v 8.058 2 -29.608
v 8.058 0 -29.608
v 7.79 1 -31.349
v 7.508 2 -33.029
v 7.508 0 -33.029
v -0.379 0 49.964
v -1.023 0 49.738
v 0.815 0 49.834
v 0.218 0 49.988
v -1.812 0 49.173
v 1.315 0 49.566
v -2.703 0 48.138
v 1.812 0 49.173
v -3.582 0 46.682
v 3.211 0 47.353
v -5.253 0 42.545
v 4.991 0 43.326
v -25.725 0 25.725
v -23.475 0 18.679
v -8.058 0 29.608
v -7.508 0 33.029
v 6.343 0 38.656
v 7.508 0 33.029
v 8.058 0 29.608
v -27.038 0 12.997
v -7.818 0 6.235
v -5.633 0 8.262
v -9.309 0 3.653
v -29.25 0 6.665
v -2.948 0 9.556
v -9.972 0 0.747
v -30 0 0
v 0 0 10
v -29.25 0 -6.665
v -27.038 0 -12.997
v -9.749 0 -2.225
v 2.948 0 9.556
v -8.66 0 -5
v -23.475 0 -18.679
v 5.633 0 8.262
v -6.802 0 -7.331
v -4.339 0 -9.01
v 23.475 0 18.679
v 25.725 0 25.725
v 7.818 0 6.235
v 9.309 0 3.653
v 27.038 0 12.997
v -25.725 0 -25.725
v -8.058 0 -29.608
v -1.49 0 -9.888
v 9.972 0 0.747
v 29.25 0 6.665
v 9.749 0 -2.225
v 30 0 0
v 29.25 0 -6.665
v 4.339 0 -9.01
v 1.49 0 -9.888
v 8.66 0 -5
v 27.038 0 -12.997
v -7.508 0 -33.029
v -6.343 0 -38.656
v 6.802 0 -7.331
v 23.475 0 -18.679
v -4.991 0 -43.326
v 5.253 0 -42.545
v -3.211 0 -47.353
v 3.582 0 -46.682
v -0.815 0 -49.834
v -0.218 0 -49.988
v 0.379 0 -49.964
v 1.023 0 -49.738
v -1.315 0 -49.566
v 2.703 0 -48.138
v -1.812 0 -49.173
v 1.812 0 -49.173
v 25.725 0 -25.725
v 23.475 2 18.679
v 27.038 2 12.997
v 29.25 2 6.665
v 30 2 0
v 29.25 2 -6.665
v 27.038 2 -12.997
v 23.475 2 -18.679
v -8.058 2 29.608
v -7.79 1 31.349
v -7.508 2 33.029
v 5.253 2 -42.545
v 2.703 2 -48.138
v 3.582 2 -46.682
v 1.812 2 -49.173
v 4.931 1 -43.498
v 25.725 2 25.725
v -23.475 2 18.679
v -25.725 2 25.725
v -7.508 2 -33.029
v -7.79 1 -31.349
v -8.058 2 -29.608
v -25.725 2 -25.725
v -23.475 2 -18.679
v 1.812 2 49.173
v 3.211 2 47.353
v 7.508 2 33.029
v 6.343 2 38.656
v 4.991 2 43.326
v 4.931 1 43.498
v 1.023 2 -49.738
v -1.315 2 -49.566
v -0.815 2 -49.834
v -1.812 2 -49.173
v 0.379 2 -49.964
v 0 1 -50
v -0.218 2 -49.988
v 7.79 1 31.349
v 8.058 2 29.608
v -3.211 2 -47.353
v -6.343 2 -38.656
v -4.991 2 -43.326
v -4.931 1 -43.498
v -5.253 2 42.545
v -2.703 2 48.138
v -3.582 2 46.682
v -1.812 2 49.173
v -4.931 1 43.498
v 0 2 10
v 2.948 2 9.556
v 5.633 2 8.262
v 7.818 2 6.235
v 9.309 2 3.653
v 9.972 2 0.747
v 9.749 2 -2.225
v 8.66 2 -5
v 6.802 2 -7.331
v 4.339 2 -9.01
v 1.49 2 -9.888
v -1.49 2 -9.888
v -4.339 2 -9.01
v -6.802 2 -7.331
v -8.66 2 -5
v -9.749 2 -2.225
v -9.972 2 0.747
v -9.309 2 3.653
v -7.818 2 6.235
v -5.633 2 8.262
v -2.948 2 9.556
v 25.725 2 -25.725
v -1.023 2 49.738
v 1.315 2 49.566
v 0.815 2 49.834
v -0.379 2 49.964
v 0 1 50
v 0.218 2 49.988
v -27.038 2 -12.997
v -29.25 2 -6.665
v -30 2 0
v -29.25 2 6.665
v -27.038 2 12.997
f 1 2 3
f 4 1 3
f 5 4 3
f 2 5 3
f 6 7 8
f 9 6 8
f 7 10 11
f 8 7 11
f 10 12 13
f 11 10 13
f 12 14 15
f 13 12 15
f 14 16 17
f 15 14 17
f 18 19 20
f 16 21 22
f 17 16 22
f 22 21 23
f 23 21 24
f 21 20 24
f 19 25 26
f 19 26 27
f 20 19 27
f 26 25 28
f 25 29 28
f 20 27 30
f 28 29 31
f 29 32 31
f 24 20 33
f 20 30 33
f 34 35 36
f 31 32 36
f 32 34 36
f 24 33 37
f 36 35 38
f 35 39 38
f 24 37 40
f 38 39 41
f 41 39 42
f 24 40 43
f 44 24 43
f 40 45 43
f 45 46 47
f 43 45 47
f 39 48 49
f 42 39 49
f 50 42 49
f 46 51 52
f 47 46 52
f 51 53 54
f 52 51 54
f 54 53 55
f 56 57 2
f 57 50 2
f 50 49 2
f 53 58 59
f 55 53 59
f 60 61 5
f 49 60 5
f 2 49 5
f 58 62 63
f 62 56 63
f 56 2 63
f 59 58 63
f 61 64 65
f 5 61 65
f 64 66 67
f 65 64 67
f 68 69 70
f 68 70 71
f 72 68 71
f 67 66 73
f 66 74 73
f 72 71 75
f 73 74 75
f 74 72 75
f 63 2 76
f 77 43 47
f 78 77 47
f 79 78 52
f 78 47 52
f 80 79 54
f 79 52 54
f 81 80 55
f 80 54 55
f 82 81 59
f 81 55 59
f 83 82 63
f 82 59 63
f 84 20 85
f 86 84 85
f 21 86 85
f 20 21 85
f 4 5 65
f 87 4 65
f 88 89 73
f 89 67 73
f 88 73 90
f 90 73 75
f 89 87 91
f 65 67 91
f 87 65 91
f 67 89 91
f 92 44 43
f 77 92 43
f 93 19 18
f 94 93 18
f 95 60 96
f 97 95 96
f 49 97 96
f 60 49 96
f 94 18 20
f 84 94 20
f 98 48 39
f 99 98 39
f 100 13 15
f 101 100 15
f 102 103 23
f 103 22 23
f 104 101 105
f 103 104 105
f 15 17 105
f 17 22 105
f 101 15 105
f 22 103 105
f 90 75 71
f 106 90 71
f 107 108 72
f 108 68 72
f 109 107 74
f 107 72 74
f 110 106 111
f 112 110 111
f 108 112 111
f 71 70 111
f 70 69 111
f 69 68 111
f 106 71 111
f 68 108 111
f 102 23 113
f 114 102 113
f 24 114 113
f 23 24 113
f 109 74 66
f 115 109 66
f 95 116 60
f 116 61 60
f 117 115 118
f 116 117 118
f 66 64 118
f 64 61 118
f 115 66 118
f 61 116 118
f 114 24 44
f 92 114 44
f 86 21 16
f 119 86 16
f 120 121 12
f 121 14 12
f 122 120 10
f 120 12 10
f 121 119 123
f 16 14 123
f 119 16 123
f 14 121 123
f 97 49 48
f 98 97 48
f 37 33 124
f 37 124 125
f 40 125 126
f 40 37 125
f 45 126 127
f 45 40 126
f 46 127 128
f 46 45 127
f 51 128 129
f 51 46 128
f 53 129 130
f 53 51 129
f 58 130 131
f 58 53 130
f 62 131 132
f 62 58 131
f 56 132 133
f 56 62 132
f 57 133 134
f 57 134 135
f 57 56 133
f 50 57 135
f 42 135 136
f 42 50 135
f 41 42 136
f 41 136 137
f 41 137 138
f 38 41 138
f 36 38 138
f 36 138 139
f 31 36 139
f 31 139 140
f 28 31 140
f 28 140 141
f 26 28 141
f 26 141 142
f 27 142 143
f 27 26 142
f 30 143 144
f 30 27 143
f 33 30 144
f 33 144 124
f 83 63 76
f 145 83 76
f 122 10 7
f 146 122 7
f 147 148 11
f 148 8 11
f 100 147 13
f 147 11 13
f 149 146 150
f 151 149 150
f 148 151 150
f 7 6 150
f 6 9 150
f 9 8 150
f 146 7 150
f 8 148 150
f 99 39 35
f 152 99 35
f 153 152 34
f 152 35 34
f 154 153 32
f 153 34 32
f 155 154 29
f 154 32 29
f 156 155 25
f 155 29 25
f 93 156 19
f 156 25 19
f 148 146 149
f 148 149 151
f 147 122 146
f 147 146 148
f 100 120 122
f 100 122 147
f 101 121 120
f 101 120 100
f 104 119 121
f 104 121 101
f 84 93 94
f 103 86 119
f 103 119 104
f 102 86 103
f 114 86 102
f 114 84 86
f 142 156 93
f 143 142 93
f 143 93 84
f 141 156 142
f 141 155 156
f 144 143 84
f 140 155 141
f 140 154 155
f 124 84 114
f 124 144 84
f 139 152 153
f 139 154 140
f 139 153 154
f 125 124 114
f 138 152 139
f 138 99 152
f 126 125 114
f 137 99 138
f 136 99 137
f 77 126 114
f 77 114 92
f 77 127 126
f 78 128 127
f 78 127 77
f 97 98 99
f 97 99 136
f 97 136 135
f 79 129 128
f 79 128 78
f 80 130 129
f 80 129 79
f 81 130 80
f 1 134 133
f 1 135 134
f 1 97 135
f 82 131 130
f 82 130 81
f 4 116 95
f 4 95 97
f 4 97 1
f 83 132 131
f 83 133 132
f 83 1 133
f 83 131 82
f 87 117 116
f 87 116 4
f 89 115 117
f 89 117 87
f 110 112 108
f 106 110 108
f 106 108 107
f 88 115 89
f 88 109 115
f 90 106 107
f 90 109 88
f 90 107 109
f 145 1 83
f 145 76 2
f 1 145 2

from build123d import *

# Parameters (mm, degrees)
SZKIC1_R                    = 10
DODANIE_WYCI_GNI_CIE1_DEPTH = 2


with BuildPart() as part:
    # Szkic1 → Dodanie-wyciągnięcie1 (new body)
    with BuildSketch(Plane(origin=(0, 0, 0), x_dir=(1, 0, 0), z_dir=(0, 1, 0))):
        with BuildLine():
            Line((25.724787771, -25.724787771), (23.475270357, -18.679177757))
            ThreePointArc((23.475270357, -18.679177757), (30, 0), (23.475270357, 18.679177757))
            Line((23.475270357, 18.679177757), (25.724787771, 25.724787771))
            Line((25.724787771, 25.724787771), (8.05822964, 29.607826273))
            add(Edge.make_bspline(
                [(8.05822964, 29.607826273), (7.79792239, 31.378992774), (7.507535684, 33.029118956)],
                knots=[5.346121376, 5.346121376, 5.346121376, 5.433983203, 5.433983203, 5.433983203], degree=2, weights=[1, 0.999035193, 1]))
            add(Edge.make_bspline(
                [(7.507535684, 33.029118956), (5.218865934, 46.034514162), (1.811566447, 49.17271271)],
                knots=[5.433983203, 5.433983203, 5.433983203, 6.101022879, 6.101022879, 6.101022879], degree=2, weights=[1, 0.944895907, 1]))
            add(Edge.make_bspline(
                [(1.811566447, 49.17271271), (0.913339162, 50), (0, 50)],
                knots=[6.101022879, 6.101022879, 6.101022879, 6.283185307, 6.283185307, 6.283185307], degree=2, weights=[1, 0.995854973, 1]))
            add(Edge.make_bspline(
                [(0, 50), (-0.913339162, 50), (-1.811566447, 49.17271271)],
                knots=[0, 0, 0, 0.182162428, 0.182162428, 0.182162428], degree=2, weights=[1, 0.995854973, 1]))
            add(Edge.make_bspline(
                [(-1.811566447, 49.17271271), (-5.218865934, 46.034514162), (-7.507535684, 33.029118956)],
                knots=[0.182162428, 0.182162428, 0.182162428, 0.849202104, 0.849202104, 0.849202104], degree=2, weights=[1, 0.944895907, 1]))
            add(Edge.make_bspline(
                [(-7.507535684, 33.029118956), (-7.79792239, 31.378992774), (-8.05822964, 29.607826273)],
                knots=[0.849202104, 0.849202104, 0.849202104, 0.937063931, 0.937063931, 0.937063931], degree=2, weights=[1, 0.999035193, 1]))
            Line((-8.05822964, 29.607826273), (-25.724787771, 25.724787771))
            Line((-25.724787771, 25.724787771), (-23.475270357, 18.679177757))
            ThreePointArc((-23.475270357, 18.679177757), (-30, 0), (-23.475270357, -18.679177757))
            Line((-23.475270357, -18.679177757), (-25.724787771, -25.724787771))
            Line((-25.724787771, -25.724787771), (-8.05822964, -29.607826273))
            add(Edge.make_bspline(
                [(-8.05822964, -29.607826273), (-7.79792239, -31.378992774), (-7.507535684, -33.029118956)],
                knots=[2.204528722, 2.204528722, 2.204528722, 2.292390549, 2.292390549, 2.292390549], degree=2, weights=[1, 0.999035193, 1]))
            add(Edge.make_bspline(
                [(-7.507535684, -33.029118956), (-5.218865934, -46.034514162), (-1.811566447, -49.17271271)],
                knots=[2.292390549, 2.292390549, 2.292390549, 2.959430225, 2.959430225, 2.959430225], degree=2, weights=[1, 0.944895907, 1]))
            add(Edge.make_bspline(
                [(-1.811566447, -49.17271271), (-0.913339162, -50), (0, -50)],
                knots=[2.959430225, 2.959430225, 2.959430225, 3.141592654, 3.141592654, 3.141592654], degree=2, weights=[1, 0.995854973, 1]))
            add(Edge.make_bspline(
                [(0, -50), (0.913339162, -50), (1.811566447, -49.17271271)],
                knots=[3.141592654, 3.141592654, 3.141592654, 3.323755082, 3.323755082, 3.323755082], degree=2, weights=[1, 0.995854973, 1]))
            add(Edge.make_bspline(
                [(1.811566447, -49.17271271), (5.218865934, -46.034514162), (7.507535684, -33.029118956)],
                knots=[3.323755082, 3.323755082, 3.323755082, 3.990794758, 3.990794758, 3.990794758], degree=2, weights=[1, 0.944895907, 1]))
            add(Edge.make_bspline(
                [(7.507535684, -33.029118956), (7.79792239, -31.378992774), (8.05822964, -29.607826273)],
                knots=[3.990794758, 3.990794758, 3.990794758, 4.078656585, 4.078656585, 4.078656585], degree=2, weights=[1, 0.999035193, 1]))
            Line((8.05822964, -29.607826273), (25.724787771, -25.724787771))
        make_face()
        with Locations(Location((0, 0, 0), (0, 0, 270))):
            Circle(SZKIC1_R, mode=Mode.SUBTRACT)
    extrude(amount=DODANIE_WYCI_GNI_CIE1_DEPTH)


solid = part.part
